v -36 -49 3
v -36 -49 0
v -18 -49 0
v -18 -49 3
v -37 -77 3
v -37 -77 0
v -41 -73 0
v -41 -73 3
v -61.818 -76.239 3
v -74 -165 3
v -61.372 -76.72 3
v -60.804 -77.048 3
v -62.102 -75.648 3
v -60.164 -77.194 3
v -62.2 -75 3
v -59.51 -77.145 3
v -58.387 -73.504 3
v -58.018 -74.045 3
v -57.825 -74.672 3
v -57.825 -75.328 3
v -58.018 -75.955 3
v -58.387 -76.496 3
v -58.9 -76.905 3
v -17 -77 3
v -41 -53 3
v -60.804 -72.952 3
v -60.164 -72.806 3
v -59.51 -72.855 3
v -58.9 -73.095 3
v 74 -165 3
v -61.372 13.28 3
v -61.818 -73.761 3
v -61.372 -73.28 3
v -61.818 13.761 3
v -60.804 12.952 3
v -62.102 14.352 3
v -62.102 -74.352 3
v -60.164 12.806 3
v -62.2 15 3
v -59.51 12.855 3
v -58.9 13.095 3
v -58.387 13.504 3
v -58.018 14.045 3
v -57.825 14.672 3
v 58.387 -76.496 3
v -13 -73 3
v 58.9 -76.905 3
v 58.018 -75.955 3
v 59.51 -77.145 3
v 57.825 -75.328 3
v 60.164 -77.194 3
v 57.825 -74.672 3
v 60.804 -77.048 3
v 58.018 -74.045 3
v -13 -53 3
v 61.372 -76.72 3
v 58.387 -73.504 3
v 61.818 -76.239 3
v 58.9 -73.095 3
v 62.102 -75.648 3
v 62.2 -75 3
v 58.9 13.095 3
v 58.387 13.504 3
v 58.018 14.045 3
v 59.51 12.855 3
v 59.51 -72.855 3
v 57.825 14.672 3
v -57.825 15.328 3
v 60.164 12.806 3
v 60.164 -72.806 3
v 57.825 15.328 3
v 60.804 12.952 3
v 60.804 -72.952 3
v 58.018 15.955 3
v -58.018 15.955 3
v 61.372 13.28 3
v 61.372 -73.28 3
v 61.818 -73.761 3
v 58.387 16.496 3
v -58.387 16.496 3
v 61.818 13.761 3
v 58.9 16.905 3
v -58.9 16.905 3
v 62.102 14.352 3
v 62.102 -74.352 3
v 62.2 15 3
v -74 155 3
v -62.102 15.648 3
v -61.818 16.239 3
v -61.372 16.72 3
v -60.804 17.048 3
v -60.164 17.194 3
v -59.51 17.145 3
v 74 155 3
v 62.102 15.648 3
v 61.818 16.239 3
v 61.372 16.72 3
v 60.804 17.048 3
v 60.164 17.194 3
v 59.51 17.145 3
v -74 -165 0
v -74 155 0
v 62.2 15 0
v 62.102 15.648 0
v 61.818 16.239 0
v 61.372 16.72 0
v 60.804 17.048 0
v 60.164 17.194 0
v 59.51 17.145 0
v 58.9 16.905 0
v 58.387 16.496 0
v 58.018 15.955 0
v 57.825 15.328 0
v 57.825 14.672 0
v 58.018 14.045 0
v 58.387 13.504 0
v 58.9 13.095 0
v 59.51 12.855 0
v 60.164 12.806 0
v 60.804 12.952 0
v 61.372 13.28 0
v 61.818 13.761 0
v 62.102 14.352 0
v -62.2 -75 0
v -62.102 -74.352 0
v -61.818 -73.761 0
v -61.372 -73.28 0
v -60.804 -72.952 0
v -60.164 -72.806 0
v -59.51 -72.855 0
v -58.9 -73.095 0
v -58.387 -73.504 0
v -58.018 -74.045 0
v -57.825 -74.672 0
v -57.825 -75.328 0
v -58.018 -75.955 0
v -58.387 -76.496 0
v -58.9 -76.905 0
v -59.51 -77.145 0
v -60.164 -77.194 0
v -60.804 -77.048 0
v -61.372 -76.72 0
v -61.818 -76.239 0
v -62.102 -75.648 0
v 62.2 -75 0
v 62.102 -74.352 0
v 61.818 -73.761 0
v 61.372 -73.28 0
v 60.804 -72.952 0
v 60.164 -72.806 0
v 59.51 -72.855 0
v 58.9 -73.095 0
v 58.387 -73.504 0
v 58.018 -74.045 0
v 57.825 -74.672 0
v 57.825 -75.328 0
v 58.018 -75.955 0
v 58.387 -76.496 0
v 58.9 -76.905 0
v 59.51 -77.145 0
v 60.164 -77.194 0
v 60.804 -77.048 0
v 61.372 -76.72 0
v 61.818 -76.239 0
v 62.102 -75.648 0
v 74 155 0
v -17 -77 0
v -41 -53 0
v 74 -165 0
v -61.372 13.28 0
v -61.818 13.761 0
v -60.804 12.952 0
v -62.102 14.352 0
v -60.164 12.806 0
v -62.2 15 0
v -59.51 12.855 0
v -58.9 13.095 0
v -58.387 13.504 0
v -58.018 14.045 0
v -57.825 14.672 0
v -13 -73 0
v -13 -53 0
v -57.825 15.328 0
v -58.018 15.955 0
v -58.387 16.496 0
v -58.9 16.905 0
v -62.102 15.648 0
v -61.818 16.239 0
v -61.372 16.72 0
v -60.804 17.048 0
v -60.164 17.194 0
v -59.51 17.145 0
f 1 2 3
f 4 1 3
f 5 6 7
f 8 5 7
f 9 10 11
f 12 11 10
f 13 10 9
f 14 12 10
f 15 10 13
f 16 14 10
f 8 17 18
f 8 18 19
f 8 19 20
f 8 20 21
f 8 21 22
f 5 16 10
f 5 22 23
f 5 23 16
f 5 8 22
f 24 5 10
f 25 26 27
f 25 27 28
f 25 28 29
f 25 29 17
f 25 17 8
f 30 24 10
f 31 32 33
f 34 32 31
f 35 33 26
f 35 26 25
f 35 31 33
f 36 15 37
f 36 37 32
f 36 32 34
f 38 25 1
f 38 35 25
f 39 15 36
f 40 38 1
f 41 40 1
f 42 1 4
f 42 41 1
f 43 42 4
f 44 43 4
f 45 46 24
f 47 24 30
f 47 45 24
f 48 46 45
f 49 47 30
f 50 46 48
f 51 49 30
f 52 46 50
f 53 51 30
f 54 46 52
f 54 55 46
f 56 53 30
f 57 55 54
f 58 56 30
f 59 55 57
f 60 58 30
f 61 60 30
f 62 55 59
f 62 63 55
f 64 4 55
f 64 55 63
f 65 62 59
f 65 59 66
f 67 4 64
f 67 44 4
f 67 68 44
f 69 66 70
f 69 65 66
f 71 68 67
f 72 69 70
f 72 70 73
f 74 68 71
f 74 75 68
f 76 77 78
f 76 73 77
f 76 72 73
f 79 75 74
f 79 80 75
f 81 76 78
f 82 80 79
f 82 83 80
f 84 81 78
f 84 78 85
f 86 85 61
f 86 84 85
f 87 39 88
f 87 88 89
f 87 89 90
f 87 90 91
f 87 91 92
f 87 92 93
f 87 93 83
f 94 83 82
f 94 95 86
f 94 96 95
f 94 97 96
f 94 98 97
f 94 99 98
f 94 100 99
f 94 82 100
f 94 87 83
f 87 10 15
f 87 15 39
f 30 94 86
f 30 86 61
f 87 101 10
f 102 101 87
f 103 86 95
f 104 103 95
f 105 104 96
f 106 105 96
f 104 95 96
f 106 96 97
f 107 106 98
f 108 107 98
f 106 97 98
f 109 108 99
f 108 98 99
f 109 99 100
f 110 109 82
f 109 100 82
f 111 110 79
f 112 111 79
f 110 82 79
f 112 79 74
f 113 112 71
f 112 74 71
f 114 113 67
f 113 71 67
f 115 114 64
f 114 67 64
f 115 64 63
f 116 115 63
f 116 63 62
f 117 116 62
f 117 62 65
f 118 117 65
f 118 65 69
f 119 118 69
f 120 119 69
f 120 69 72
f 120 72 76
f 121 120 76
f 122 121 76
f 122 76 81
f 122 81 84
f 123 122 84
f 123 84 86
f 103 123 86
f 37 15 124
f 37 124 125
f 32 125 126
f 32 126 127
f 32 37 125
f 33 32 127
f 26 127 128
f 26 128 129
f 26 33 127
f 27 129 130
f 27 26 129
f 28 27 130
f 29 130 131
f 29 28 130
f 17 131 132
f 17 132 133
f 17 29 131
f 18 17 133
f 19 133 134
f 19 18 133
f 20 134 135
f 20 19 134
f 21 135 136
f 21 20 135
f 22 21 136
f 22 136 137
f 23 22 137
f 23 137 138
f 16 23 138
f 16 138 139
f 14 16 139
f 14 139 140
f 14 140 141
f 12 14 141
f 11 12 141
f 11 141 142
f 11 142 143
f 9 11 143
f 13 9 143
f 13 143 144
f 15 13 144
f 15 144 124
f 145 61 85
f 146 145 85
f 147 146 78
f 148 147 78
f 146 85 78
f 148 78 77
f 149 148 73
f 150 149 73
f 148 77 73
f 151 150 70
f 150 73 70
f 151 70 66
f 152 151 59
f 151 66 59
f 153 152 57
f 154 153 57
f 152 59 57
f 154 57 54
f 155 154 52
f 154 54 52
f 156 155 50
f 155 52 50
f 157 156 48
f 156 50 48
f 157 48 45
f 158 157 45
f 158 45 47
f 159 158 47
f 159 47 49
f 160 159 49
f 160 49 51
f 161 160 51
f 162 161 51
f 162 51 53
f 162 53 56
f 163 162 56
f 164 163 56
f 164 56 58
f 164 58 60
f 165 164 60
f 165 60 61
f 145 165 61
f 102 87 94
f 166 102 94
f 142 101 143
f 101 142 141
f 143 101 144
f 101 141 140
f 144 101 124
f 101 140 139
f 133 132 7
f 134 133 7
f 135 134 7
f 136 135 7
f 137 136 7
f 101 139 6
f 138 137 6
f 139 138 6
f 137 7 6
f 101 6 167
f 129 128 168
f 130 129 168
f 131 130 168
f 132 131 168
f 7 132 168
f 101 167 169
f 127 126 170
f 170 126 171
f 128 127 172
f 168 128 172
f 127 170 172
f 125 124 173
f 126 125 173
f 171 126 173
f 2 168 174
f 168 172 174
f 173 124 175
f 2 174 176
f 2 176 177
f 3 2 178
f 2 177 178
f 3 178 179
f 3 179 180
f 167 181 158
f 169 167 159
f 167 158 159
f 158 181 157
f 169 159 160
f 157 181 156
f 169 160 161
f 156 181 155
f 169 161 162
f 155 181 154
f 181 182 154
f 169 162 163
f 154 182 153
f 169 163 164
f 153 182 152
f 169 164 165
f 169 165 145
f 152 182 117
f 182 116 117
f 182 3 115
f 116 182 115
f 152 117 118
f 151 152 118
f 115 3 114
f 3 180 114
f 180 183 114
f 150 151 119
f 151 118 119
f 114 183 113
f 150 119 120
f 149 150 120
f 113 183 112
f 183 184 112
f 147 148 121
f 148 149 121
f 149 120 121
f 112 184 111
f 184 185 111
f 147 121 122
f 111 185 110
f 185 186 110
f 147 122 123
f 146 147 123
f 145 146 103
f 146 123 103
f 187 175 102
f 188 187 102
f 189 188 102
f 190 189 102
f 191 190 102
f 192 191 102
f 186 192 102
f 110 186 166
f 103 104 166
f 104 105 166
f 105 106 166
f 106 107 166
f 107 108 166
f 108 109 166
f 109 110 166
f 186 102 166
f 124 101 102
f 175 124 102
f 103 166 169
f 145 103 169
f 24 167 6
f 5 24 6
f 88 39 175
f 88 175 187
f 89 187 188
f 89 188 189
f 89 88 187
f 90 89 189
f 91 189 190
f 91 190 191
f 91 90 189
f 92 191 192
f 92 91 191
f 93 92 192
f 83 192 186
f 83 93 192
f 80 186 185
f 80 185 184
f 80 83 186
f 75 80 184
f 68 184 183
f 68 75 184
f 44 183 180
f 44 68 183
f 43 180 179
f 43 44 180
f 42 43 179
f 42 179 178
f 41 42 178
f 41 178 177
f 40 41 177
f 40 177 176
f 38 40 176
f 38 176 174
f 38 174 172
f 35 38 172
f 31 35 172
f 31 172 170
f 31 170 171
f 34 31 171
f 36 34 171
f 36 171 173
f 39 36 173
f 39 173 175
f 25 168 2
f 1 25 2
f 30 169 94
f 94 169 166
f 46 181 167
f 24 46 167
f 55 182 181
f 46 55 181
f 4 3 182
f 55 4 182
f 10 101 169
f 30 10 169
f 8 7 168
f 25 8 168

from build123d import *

# Parameters (mm, degrees)
ESQUISSE1_W             = 148
ESQUISSE1_H             = 330
BOSS_EXTRU_1_DEPTH      = 3
ENL_V_MAT_EXTRU_2_REACH = 182.859
ESQUISSE3_R             = 2.2
ENL_V_MAT_EXTRU_3_REACH = 182.859
ESQUISSE4_W             = 148
ESQUISSE4_H             = 10
ENL_V_MAT_EXTRU_4_REACH = 182.859


with BuildPart() as part:
    # Esquisse1 → Boss.-Extru.1 (new body)
    with BuildSketch(Plane.XY):
        Rectangle(ESQUISSE1_W, ESQUISSE1_H)
    extrude(amount=BOSS_EXTRU_1_DEPTH)

    # Esquisse3 → Enlèv. mat.-Extru.2 (cut, up to next)
    with BuildSketch(Plane.XY.offset(3), mode=Mode.PRIVATE) as enl_v_mat_extru_2_sk1:
        with Locations((60, -75)):
            Circle(ESQUISSE3_R)
    enl_v_mat_extru_2_tool1 = extrude(enl_v_mat_extru_2_sk1.sketch, amount=-ENL_V_MAT_EXTRU_2_REACH, mode=Mode.PRIVATE) & part.part
    # Esquisse3 → Enlèv. mat.-Extru.2 (cut, up to next)
    with BuildSketch(Plane.XY.offset(3), mode=Mode.PRIVATE) as enl_v_mat_extru_2_sk2:
        with Locations((60, 15)):
            Circle(ESQUISSE3_R)
    enl_v_mat_extru_2_tool2 = extrude(enl_v_mat_extru_2_sk2.sketch, amount=-ENL_V_MAT_EXTRU_2_REACH, mode=Mode.PRIVATE) & part.part
    enl_v_mat_extru_2_1 = enl_v_mat_extru_2_tool1.solids().sort_by_distance((60, -75, 3))[0]
    add(enl_v_mat_extru_2_1, mode=Mode.SUBTRACT)
    enl_v_mat_extru_2_2 = enl_v_mat_extru_2_tool2.solids().sort_by_distance((60, 15, 3))[0]
    add(enl_v_mat_extru_2_2, mode=Mode.SUBTRACT)
    enl_v_mat_extru_2 = enl_v_mat_extru_2_1 + enl_v_mat_extru_2_2  # Enlèv. mat.-Extru.2 as one shape, for the pattern or mirror that repeats it

    # Esquisse4 → Enlèv. mat.-Extru.3 (cut, up to next)
    with BuildSketch(Plane.XY.offset(3), mode=Mode.PRIVATE) as enl_v_mat_extru_3_sk1:
        with Locations((0, 160)):
            Rectangle(ESQUISSE4_W, ESQUISSE4_H)
    enl_v_mat_extru_3_tool1 = extrude(enl_v_mat_extru_3_sk1.sketch, amount=-ENL_V_MAT_EXTRU_3_REACH, mode=Mode.PRIVATE) & part.part
    add(enl_v_mat_extru_3_tool1.solids().sort_by_distance((0, 160, 3))[0], mode=Mode.SUBTRACT)

    # Symétrie1: Enlèv. mat.-Extru.2 across plane
    add(enl_v_mat_extru_2.mirror(Plane(origin=(0, 0, 0), x_dir=(0, 0, 1), z_dir=(1, 0, 0))), mode=Mode.SUBTRACT)

    # Esquisse5 → Enlèv. mat.-Extru.4 (cut, up to next)
    with BuildSketch(Plane(origin=(0, 0, 0), x_dir=(-1, 0, 0), z_dir=(0, 0, -1)), mode=Mode.PRIVATE) as enl_v_mat_extru_4_sk1:
        Polygon((17, -77), (37, -77), (41, -73), (41, -63), (41, -53), (36, -49), (18, -49), (13, -53), (13, -63), (13, -73), align=None)
    enl_v_mat_extru_4_tool1 = extrude(enl_v_mat_extru_4_sk1.sketch, amount=-ENL_V_MAT_EXTRU_4_REACH, mode=Mode.PRIVATE) & part.part
    add(enl_v_mat_extru_4_tool1.solids().sort_by_distance((-27, -63.067736, 0))[0], mode=Mode.SUBTRACT)


solid = part.part
